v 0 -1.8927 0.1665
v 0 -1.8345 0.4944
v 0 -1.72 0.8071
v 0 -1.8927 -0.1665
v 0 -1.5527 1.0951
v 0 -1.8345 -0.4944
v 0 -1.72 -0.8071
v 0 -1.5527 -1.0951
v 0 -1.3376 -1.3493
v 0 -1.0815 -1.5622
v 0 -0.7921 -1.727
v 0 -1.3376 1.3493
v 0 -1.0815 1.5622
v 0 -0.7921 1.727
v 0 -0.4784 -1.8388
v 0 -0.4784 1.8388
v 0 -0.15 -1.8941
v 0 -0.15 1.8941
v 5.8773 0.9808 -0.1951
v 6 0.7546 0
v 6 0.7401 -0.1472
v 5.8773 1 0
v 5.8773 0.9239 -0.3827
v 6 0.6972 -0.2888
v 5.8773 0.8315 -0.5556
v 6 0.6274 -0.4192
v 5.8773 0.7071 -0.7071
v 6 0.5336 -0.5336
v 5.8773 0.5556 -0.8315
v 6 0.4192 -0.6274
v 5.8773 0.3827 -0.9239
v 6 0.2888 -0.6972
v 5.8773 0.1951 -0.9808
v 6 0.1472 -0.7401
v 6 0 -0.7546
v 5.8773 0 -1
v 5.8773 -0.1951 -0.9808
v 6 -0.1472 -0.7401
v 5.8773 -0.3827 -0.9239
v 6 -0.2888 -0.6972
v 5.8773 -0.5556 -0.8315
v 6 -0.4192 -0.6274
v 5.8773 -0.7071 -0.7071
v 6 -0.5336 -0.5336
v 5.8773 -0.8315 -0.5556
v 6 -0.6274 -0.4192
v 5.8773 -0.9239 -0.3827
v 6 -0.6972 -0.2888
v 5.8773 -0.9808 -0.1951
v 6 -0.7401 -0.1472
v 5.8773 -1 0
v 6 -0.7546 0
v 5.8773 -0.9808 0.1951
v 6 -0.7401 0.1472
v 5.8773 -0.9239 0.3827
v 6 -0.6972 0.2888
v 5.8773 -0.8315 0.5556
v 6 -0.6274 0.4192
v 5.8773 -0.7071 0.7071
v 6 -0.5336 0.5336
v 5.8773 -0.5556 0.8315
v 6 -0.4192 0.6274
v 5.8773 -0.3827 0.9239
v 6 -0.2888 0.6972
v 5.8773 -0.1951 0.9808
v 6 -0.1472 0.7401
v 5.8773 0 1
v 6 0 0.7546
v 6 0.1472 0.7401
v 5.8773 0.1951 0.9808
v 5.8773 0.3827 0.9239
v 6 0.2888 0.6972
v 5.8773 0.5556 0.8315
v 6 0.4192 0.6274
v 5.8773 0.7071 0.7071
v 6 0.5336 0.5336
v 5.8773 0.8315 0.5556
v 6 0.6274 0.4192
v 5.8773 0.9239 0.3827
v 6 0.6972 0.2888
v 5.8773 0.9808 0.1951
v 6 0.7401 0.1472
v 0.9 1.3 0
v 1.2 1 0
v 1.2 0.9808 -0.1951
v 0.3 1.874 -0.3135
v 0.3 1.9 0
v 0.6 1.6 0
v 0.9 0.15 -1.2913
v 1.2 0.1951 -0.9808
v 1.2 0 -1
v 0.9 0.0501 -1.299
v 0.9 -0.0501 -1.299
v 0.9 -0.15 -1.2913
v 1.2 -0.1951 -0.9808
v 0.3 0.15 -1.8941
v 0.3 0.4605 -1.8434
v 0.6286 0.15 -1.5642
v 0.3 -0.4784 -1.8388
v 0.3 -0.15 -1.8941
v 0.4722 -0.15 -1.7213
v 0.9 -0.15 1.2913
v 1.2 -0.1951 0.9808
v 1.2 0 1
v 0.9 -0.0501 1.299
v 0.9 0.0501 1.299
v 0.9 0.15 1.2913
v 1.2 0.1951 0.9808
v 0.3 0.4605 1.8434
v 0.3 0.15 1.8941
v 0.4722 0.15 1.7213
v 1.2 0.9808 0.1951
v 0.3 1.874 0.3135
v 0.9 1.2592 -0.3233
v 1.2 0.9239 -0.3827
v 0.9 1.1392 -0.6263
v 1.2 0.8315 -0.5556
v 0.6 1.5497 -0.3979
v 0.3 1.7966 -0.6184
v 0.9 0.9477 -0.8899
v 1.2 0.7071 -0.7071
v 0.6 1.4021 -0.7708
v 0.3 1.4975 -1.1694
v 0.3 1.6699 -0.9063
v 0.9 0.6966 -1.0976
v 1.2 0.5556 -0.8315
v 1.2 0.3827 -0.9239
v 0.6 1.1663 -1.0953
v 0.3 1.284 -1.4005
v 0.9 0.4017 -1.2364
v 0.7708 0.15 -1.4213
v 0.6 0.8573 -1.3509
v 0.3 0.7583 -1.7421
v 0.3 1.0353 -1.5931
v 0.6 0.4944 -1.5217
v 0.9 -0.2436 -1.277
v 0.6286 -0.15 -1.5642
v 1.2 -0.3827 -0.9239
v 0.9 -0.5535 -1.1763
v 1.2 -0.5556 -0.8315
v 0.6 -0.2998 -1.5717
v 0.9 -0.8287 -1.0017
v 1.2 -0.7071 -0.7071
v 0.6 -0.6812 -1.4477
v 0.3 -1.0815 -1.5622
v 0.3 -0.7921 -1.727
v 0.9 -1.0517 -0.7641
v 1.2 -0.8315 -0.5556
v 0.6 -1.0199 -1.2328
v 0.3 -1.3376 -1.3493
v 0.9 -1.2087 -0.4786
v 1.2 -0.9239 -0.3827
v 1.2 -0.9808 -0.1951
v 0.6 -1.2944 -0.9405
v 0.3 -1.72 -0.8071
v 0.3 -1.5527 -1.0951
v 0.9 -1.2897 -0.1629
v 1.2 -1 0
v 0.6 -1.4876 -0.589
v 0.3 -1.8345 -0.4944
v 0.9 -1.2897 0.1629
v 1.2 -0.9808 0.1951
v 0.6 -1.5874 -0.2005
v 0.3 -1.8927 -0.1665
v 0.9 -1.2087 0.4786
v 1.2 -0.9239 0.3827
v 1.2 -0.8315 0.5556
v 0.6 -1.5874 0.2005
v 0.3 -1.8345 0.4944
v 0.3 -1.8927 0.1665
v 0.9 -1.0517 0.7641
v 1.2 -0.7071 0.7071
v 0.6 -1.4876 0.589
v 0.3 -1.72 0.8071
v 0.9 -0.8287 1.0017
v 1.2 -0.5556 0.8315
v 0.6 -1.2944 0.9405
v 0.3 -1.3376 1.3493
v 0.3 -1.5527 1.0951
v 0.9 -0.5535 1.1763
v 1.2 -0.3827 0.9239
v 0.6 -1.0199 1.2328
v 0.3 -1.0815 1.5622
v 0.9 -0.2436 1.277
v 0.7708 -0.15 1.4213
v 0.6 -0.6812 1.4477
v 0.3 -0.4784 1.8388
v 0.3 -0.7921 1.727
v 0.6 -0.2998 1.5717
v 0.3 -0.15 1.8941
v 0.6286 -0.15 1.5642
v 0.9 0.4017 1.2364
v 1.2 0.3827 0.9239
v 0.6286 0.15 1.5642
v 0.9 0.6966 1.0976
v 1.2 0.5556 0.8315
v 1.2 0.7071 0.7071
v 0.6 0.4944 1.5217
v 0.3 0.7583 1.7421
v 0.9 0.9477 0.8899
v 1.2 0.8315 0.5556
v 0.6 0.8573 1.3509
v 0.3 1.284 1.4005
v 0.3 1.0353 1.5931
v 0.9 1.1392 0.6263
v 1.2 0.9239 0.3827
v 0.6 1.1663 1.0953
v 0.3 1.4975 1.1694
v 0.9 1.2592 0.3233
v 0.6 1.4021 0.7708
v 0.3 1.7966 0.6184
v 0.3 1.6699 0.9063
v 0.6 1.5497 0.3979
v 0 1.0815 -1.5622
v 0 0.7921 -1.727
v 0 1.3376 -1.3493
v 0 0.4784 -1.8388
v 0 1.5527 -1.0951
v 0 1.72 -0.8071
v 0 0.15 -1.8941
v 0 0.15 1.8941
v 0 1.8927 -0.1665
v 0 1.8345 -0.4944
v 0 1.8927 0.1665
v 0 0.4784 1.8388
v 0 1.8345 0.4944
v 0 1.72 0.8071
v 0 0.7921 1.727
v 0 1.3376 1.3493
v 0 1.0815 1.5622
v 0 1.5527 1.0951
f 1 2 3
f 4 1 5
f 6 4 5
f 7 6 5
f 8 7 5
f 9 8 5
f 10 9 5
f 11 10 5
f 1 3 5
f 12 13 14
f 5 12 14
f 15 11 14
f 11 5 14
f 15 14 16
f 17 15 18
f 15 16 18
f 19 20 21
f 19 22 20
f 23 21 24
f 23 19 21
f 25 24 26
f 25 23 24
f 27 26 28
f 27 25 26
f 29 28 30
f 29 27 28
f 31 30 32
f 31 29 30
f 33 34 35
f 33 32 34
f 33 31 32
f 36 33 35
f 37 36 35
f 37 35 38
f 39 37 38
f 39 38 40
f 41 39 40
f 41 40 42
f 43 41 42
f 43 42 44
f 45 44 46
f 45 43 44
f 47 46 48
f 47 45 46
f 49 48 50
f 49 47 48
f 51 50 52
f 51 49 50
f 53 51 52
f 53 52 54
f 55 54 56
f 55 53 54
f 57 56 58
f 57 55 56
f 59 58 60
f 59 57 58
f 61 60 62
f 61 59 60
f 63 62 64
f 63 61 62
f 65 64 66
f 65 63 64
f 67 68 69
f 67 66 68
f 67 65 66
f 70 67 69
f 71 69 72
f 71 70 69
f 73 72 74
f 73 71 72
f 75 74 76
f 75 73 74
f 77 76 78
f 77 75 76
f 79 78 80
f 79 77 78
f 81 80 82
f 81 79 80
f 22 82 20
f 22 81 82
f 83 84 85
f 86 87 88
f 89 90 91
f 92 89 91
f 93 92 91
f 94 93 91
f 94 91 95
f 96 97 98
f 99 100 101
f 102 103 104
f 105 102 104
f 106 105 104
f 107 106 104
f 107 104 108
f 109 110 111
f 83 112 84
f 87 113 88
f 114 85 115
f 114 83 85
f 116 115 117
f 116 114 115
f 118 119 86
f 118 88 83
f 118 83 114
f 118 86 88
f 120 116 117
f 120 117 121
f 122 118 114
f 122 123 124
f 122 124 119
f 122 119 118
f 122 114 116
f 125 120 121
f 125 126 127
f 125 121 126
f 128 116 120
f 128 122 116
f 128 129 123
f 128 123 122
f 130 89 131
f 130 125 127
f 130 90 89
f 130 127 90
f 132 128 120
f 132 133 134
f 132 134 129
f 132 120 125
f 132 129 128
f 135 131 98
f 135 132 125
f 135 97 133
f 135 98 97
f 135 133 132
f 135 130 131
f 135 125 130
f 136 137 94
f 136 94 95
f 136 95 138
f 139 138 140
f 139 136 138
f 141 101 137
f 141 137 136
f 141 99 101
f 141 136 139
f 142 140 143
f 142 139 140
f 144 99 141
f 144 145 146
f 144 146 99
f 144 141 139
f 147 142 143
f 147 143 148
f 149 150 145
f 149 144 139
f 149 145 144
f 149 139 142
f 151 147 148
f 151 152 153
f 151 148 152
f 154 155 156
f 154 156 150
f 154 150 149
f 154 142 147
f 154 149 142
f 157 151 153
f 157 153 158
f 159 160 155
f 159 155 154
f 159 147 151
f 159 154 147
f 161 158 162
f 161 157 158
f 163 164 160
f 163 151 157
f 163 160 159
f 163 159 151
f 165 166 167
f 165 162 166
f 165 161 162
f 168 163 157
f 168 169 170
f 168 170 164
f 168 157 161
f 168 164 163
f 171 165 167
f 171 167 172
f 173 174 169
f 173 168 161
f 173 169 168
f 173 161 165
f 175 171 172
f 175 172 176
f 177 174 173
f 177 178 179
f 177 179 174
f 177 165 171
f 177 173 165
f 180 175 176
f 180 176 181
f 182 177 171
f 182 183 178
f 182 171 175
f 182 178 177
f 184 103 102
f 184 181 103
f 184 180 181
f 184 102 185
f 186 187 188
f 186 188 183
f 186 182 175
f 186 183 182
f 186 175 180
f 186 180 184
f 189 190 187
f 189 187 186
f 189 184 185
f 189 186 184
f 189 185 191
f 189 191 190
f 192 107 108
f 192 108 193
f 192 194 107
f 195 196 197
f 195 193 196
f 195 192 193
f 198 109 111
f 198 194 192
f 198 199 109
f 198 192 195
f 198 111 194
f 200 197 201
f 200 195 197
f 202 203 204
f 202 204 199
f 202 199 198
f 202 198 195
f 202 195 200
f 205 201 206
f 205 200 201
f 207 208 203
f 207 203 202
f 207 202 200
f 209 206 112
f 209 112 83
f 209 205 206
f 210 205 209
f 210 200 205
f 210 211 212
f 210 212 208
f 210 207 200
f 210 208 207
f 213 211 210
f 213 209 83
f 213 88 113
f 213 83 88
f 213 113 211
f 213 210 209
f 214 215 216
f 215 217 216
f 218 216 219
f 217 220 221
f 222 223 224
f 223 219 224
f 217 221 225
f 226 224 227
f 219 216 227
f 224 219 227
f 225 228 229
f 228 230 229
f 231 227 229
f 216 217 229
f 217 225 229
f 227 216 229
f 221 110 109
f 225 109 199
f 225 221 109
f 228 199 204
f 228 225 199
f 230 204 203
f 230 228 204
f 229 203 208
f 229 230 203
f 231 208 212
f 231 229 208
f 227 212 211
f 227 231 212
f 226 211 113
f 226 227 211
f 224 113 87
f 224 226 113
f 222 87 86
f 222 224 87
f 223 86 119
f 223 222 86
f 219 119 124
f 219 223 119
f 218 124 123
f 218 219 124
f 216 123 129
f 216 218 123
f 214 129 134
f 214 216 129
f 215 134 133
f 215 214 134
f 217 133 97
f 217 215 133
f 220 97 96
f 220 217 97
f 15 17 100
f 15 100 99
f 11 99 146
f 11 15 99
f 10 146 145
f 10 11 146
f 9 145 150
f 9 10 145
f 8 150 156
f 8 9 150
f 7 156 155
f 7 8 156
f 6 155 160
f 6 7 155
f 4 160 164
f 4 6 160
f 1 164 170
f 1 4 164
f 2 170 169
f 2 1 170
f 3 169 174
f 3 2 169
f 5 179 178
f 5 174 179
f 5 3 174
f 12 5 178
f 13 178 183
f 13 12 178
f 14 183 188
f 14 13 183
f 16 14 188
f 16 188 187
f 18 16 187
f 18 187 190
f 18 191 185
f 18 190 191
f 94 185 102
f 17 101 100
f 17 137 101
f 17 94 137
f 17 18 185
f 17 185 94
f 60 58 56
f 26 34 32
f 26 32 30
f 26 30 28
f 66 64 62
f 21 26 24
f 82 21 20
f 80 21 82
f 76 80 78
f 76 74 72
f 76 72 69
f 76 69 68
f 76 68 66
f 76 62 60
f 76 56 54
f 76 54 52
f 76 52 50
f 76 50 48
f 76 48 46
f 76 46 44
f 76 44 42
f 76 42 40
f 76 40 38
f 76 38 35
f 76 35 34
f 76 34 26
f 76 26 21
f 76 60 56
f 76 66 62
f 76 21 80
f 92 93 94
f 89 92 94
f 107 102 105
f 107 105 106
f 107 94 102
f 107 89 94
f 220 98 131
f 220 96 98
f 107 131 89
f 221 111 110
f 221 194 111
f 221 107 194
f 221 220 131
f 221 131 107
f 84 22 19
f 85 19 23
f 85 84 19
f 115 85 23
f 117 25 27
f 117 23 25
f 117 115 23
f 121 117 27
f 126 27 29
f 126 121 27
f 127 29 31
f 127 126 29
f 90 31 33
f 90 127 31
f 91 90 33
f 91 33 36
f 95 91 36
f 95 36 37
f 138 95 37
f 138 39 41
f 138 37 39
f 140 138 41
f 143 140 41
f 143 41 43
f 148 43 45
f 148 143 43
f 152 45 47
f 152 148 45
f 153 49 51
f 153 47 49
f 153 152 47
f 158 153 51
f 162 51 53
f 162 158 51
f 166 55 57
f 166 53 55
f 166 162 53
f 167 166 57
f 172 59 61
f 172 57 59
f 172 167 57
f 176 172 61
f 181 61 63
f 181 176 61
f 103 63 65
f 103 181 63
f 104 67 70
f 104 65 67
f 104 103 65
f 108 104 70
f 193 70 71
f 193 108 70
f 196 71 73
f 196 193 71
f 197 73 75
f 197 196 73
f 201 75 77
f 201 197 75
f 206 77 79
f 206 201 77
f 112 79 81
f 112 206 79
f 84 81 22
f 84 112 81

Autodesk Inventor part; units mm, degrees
ref_plane "YZ Plane" through (0, 0, 0) normal (1, 0, 0) x (0, 1, 0)
ref_plane "XZ Plane" through (0, 0, 0) normal (0, 1, 0) x (-1, 0, 0)
sketch "Эскиз1" plane through (0, 0, 0) normal (0, 0, 1) x (1, 0, 0)
  line L0 (0, 0) -> (6, 0)
  line L1 (6, 0) -> (6, 1)
  line L2 (6, 1) -> (1.6, 1)
  line L3 (1.6, 1) -> (1.3546, 1)
  line L4 (1.3546, 1) -> (1.2, 1)
  line L5 (1.2, 1) -> (0.3, 1.9)
  line L6 (0.3, 1.9) -> (0, 1.9)
  line L7 (0, 1.9) -> (0, 0)
  line L8 (1.6, 1) -> (1.2, 1) construction
  line L9 (-1.2, 0) -> (7.2, 0) projected
  line L10 (0, 2.28) -> (0, -0.38) projected
  dimension "d0" = 6
  dimension "d1" = 45
  dimension "d2" = 0.2454
  dimension "d3" = 4.4
  dimension "d4" = 1.2
  dimension "d5" = 2
  dimension "d6" = 2
  dimension "d7" = 3.8
revolve "Базовый элемент" add sketch "Эскиз1" angle 360 about axis through (0, 0, 0) along (1, 0, 0)
sketch "Эскиз2" plane through (0, 0, 0) normal (-1, 0, 0) x (0, 0, 1)
  line L0 (1.9, -0.15) -> (-1.9, -0.15)
  line L1 (-1.9, -0.15) -> (-1.9, 0.15)
  line L2 (-1.9, 0.15) -> (1.9, 0.15)
  line L3 (1.9, 0.15) -> (1.9, -0.15)
  line L4 (0, 0.15) -> (0, -0.15) construction
  line L5 (-1.9, 0) -> (1.9, 0) construction
  line L6 (0, 1.9) -> (0, 0) projected
  dimension "d15" = 0.3
  dimension "d16" = 3.8
extrude "Паз" cut sketch "Эскиз2" against normal blind 0.9
thread "Резьба" size "M2x0.4" class "6g" standard "ISO Metric profile" length 4.4
chamfer "Фаска1" distance 0.2454 distance2 0.1227 1 edges at (6, -1, 0) measured on face at (6, -0.0858, 0.7069)
ref_plane "Work Plane1" through (33.575, 0, 0) normal (0, 0, -1) x (1, 0, 0)
equation "\"d0\" = NLG"
equation "\"d1\" = 0.5 * SEWI"
equation "\"d2\" = GAL"
equation "\"d3\" = GEL"
equation "\"d4\" = KOH"
equation "\"d5\" = BDM"
equation "\"d6\" = GD"
equation "\"d7\" = KOD"
equation "\"d15\" = SBR"
equation "\"d16\" = KOD"
equation "\"d8\" = STI"
equation "\"d10\" = GEL"
equation "\"d12\" = -0.5 * SPD + 0.5 * GD"
equation "\"d13\" = 0.5 * GAL"
equation "\"NLG\" = 6"
equation "\"GAL\" = 0.61345 * PTC"
equation "\"GEL\" = 4.4"
equation "\"KOH\" = 1.2"
equation "\"KOD\" = 3.8"
equation "\"SEWI\" = 90deg"
equation "\"BDM\" = NND"
equation "\"GD\" = NND"
equation "\"SBR\" = 0.3"
equation "\"STI\" = 0.9"
equation "\"SPD\" = NND - 1.2269 * PTC"
equation "\"GUL\" = 0.61345 * PTC"
equation "\"PTC\" = 0.4"
equation "\"EPV\" = 2.2"
equation "\"THREADDIA\" = 2"
equation "\"TOA\" = 30deg"
equation "\"FAWI\" = 45deg"
equation "\"RR\" = 0.1 * NND"
equation "\"NND\" = 2"
equation "\"GD1\" = THREADDIA - 1.2269 * PTC"
properties part number "Винт M2-6gx6 ГОСТ 17475-80" material "Сталь, мягкая"
